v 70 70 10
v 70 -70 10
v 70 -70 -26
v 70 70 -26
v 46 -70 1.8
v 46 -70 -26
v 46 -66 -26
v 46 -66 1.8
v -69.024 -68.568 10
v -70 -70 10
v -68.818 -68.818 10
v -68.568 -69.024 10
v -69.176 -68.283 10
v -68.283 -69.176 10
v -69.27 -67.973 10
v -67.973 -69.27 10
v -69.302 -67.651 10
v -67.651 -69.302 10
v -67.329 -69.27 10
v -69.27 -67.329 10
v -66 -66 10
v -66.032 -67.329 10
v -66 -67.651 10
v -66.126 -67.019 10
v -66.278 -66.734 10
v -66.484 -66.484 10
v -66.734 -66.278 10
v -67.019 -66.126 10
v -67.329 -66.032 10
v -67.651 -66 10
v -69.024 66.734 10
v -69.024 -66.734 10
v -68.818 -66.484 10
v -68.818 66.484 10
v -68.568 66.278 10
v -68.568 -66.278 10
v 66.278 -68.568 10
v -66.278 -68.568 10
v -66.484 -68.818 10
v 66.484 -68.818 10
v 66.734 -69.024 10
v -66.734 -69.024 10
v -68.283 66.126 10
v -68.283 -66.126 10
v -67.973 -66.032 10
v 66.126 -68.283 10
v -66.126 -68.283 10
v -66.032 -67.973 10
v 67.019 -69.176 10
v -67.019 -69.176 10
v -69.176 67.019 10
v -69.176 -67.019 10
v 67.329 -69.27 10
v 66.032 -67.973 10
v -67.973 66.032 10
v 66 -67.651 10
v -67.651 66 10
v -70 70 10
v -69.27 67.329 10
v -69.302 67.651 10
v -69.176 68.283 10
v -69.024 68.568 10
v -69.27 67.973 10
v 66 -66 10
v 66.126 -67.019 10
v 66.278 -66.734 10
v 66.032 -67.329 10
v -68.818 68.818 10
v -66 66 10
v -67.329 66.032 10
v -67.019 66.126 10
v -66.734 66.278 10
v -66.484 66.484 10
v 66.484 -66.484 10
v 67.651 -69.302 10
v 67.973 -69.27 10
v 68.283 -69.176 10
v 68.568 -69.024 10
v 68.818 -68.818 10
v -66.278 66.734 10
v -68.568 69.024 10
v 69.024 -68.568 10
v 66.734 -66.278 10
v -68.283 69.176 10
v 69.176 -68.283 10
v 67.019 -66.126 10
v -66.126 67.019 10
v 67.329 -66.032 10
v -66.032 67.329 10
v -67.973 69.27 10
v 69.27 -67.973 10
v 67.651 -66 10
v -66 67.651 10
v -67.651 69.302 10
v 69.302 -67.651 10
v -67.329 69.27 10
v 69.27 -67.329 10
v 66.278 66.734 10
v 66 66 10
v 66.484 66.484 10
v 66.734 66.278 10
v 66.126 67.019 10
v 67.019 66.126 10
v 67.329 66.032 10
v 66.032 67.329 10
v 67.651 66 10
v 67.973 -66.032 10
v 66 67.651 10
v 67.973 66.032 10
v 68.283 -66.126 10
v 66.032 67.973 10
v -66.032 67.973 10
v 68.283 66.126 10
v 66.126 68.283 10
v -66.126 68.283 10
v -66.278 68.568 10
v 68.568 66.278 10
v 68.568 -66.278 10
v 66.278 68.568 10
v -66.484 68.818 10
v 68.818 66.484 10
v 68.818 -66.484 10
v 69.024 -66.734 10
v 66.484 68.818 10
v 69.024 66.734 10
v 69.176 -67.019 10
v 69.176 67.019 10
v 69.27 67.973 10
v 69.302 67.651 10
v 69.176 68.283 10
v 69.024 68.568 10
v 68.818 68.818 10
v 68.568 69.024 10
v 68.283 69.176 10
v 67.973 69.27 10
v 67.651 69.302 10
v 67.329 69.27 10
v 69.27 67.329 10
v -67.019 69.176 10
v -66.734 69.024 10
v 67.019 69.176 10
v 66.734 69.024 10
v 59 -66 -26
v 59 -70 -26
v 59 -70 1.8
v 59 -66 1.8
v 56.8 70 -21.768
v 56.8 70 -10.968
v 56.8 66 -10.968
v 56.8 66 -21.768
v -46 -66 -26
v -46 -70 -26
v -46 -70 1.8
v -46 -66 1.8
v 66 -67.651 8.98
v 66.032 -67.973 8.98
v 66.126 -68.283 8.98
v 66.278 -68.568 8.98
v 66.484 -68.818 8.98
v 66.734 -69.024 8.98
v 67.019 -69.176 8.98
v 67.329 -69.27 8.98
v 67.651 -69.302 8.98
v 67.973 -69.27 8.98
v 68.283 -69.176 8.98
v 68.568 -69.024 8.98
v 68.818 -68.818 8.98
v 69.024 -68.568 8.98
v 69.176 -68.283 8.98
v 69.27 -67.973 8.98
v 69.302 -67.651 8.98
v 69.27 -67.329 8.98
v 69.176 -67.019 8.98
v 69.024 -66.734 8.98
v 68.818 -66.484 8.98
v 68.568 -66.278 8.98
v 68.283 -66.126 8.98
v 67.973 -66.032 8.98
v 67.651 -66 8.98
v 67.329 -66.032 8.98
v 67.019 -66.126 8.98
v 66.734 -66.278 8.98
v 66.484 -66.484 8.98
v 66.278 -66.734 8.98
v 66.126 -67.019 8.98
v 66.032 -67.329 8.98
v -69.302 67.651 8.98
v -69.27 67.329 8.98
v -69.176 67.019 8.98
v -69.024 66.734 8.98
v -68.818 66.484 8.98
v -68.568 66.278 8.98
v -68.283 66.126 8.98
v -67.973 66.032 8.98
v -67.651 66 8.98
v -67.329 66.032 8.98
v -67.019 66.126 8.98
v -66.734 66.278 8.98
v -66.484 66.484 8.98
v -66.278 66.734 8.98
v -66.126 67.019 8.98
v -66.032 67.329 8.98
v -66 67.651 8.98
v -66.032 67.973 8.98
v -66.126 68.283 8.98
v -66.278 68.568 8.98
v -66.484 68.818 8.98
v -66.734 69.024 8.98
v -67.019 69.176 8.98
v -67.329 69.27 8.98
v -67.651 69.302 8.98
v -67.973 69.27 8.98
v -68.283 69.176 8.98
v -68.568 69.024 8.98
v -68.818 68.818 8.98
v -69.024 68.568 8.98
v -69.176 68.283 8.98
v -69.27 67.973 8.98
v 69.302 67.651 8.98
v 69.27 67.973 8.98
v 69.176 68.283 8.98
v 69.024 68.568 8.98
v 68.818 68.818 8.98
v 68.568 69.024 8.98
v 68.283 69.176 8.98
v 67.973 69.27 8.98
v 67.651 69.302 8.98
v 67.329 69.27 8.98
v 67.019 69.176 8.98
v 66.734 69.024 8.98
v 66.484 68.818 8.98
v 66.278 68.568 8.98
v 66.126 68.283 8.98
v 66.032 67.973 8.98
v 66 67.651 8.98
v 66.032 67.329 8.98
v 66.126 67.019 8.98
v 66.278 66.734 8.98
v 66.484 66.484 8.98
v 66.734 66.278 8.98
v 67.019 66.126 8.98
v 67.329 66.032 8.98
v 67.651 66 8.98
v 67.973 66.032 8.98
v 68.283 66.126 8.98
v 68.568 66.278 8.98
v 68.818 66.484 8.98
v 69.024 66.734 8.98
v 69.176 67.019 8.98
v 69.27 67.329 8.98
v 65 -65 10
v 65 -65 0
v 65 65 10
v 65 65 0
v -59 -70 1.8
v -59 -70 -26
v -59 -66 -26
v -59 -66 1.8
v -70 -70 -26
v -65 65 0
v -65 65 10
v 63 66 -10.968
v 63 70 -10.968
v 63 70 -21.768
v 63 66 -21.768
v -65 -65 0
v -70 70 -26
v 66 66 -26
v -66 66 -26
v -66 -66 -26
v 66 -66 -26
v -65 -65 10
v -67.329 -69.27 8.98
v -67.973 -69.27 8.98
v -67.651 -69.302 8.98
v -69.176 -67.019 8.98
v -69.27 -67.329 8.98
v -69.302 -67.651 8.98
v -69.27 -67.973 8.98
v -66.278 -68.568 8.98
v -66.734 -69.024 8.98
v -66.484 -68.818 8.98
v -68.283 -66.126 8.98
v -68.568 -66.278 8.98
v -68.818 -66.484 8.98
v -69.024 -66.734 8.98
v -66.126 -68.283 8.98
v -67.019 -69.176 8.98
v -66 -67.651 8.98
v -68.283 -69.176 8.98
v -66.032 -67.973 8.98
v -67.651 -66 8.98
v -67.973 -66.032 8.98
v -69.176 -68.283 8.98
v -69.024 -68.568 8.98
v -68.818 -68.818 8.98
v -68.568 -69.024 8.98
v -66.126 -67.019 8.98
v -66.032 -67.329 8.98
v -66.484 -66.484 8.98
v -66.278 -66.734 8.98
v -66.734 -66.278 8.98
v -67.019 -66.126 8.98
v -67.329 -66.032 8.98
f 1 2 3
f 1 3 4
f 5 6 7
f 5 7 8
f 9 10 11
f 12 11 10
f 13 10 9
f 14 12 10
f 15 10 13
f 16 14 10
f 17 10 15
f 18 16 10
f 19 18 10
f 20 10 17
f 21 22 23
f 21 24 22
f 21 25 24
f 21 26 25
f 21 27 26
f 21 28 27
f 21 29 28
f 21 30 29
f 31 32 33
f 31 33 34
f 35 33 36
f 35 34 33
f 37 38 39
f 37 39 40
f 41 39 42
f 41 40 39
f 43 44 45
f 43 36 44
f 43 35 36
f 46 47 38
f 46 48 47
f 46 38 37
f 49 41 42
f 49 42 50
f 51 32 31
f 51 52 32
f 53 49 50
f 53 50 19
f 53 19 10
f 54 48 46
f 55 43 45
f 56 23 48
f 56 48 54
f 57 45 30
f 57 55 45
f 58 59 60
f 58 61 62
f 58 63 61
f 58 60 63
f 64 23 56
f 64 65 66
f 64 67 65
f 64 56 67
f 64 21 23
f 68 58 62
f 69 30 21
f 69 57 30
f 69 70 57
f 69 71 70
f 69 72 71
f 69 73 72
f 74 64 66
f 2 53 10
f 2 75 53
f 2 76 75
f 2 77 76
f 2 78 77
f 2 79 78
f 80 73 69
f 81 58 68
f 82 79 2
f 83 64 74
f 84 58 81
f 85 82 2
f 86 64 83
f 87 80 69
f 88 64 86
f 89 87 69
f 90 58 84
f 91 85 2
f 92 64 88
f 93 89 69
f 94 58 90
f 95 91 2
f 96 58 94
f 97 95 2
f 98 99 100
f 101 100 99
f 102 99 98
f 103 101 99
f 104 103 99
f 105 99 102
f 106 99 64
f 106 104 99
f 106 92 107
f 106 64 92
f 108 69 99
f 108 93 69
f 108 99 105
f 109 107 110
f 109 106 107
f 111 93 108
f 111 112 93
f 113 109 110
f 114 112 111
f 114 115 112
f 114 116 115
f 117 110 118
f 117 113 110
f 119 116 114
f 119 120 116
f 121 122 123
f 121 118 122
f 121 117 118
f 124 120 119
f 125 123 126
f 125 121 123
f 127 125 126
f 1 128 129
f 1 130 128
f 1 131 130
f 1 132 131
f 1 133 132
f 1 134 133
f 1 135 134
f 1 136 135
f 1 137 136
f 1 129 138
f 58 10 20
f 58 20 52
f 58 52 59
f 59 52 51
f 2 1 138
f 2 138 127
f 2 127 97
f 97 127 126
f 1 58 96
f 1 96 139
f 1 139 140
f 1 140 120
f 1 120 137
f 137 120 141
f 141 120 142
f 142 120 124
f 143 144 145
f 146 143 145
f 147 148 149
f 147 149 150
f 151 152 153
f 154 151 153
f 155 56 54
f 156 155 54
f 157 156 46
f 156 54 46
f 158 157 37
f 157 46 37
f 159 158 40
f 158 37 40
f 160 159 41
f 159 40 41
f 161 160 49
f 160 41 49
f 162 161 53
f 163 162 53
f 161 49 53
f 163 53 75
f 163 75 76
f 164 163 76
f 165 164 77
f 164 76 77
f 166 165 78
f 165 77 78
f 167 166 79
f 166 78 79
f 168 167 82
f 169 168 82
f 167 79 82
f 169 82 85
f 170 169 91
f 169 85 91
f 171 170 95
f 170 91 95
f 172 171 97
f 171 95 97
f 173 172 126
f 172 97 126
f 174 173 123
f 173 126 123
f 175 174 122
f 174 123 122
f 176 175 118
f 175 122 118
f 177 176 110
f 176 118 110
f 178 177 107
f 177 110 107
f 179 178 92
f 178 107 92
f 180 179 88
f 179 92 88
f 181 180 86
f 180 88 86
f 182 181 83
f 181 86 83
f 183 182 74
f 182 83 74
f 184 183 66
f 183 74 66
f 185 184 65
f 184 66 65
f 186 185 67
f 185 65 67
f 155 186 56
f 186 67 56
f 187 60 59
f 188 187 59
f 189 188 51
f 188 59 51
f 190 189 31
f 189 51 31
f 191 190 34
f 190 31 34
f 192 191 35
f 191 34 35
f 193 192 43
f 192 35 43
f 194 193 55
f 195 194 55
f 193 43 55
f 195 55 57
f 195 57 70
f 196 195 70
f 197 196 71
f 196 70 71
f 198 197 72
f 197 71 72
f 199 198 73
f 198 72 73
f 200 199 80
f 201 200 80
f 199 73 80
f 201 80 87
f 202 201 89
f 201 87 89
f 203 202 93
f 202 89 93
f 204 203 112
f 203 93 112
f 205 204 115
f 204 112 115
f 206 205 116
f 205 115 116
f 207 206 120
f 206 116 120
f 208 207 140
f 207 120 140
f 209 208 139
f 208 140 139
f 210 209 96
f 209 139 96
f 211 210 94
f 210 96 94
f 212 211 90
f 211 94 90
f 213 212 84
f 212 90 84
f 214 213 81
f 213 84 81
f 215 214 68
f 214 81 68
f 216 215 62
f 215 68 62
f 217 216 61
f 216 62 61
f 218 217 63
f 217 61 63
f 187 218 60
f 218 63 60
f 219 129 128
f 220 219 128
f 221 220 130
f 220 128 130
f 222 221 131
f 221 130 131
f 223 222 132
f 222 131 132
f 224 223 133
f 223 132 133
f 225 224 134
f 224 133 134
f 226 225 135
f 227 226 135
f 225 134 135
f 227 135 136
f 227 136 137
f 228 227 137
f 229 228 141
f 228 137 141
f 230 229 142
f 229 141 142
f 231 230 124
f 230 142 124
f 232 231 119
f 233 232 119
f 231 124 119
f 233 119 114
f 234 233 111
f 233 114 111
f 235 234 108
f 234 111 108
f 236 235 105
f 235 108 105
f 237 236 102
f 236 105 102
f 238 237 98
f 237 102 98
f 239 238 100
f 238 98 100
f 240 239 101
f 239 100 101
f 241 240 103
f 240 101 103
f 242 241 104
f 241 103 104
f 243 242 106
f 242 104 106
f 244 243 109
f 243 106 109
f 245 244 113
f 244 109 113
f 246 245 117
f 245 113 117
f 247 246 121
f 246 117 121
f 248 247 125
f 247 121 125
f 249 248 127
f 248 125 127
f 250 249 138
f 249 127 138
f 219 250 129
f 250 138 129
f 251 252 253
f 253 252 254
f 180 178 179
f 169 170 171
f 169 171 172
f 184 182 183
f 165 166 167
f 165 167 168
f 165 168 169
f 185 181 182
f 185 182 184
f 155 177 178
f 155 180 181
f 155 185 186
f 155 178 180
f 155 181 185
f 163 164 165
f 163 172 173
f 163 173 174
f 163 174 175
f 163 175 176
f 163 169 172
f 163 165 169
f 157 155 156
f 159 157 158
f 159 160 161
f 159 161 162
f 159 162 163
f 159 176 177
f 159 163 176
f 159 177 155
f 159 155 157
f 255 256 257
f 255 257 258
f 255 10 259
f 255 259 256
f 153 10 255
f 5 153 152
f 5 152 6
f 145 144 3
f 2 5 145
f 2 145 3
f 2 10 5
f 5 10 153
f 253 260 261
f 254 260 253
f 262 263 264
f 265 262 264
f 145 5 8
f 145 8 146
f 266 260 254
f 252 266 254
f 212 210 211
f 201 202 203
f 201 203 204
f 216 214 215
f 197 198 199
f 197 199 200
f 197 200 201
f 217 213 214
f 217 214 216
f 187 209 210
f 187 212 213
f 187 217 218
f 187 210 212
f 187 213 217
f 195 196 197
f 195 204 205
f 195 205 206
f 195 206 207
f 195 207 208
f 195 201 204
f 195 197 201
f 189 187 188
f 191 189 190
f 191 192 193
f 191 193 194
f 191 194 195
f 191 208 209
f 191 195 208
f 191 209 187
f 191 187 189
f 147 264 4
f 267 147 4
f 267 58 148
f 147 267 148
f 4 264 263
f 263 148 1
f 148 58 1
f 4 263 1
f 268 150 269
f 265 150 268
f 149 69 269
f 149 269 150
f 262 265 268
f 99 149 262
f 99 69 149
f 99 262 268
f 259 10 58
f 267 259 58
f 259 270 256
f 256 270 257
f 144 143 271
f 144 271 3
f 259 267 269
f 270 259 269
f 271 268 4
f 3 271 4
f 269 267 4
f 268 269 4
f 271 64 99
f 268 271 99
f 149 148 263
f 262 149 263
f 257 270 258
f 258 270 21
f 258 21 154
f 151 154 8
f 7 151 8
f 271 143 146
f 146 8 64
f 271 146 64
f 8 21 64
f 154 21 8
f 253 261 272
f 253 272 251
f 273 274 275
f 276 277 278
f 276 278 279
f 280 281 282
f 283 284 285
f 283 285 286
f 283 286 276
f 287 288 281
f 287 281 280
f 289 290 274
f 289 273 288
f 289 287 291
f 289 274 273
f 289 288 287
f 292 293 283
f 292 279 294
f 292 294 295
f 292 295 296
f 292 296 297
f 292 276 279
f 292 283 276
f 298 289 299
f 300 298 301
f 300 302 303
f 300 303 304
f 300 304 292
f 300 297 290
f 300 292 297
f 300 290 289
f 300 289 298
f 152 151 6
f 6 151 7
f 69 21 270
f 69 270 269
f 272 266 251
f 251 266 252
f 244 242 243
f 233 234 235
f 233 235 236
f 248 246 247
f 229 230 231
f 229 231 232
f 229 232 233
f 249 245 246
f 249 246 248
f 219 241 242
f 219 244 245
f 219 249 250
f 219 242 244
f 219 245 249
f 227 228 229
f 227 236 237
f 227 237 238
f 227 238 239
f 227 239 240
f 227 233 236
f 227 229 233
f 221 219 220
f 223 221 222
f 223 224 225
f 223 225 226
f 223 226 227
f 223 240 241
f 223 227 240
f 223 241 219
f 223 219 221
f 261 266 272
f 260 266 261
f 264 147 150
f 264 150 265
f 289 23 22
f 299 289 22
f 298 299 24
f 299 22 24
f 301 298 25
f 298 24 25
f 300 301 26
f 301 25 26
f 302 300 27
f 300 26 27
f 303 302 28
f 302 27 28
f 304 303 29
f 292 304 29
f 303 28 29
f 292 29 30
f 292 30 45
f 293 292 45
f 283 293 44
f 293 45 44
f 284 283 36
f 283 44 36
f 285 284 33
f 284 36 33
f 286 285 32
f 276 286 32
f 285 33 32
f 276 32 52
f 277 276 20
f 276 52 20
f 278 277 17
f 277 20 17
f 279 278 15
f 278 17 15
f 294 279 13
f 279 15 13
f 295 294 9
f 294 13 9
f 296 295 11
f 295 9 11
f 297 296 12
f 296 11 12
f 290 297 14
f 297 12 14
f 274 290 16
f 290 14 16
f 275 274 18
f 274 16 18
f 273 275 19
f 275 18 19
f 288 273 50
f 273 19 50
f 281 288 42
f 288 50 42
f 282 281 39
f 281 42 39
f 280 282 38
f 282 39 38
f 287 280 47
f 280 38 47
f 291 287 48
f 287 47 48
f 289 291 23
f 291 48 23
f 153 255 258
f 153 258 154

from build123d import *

# Parameters (mm, degrees)
SKETCH5_W           = 130
SKETCH5_H           = 130
BOSS_EXTRUDE4_DEPTH = 10
SKETCH6_W           = 140
SKETCH6_H           = 140
SKETCH6_W_2         = 132
SKETCH6_H_2         = 132
BOSS_EXTRUDE5_DEPTH = 36
SKETCH7_R           = 1.651
CUT_EXTRUDE2_DEPTH  = 1.02
SKETCH8_W           = 13
SKETCH8_H           = 27.8
CUT_EXTRUDE3_DEPTH  = 4
SKETCH9_W           = 6.2
SKETCH9_H           = 10.8
CUT_EXTRUDE4_DEPTH  = 10


with BuildPart() as part:
    # Sketch5 → Boss-Extrude4 (new body)
    with BuildSketch(Plane.XY):
        Rectangle(SKETCH5_W, SKETCH5_H)
    extrude(amount=BOSS_EXTRUDE4_DEPTH)


with BuildPart() as body_2:
    # Sketch6 → Boss-Extrude5 (new body)
    with BuildSketch(Plane.XY.offset(10)):
        Rectangle(SKETCH6_W, SKETCH6_H)
        Rectangle(SKETCH6_W_2, SKETCH6_H_2, mode=Mode.SUBTRACT)
    extrude(amount=-BOSS_EXTRUDE5_DEPTH)

    # Sketch7 → Cut-Extrude2 (cut)
    with BuildSketch(Plane.XY.offset(10)):
        with Locations((67.651, 67.651)):
            Circle(SKETCH7_R)
        with Locations(Location((-67.651, 67.651, 0), (0, 0, 180))):
            Circle(SKETCH7_R)
        with Locations(Location((67.651, -67.651, 0), (0, 0, 180))):
            Circle(SKETCH7_R)
        with Locations((-67.651, -67.651)):
            Circle(SKETCH7_R)
    extrude(amount=-CUT_EXTRUDE2_DEPTH, mode=Mode.SUBTRACT)

    # Sketch8 → Cut-Extrude3 (cut)
    with BuildSketch(Plane.XZ.offset(70)):
        with Locations((-52.5, -12.1)):
            Rectangle(SKETCH8_W, SKETCH8_H)
        with Locations((52.5, -12.1)):
            Rectangle(SKETCH8_W, SKETCH8_H)
    extrude(amount=-CUT_EXTRUDE3_DEPTH, mode=Mode.SUBTRACT)

    # Sketch9 → Cut-Extrude4 (cut)
    with BuildSketch(Plane(origin=(0, 70, 0), x_dir=(1, 0, 0), z_dir=(0, 1, 0))):
        with Locations((59.9, 16.368072475)):
            Rectangle(SKETCH9_W, SKETCH9_H)
    extrude(amount=-CUT_EXTRUDE4_DEPTH, mode=Mode.SUBTRACT)


solid = Compound([part.part, body_2.part])
